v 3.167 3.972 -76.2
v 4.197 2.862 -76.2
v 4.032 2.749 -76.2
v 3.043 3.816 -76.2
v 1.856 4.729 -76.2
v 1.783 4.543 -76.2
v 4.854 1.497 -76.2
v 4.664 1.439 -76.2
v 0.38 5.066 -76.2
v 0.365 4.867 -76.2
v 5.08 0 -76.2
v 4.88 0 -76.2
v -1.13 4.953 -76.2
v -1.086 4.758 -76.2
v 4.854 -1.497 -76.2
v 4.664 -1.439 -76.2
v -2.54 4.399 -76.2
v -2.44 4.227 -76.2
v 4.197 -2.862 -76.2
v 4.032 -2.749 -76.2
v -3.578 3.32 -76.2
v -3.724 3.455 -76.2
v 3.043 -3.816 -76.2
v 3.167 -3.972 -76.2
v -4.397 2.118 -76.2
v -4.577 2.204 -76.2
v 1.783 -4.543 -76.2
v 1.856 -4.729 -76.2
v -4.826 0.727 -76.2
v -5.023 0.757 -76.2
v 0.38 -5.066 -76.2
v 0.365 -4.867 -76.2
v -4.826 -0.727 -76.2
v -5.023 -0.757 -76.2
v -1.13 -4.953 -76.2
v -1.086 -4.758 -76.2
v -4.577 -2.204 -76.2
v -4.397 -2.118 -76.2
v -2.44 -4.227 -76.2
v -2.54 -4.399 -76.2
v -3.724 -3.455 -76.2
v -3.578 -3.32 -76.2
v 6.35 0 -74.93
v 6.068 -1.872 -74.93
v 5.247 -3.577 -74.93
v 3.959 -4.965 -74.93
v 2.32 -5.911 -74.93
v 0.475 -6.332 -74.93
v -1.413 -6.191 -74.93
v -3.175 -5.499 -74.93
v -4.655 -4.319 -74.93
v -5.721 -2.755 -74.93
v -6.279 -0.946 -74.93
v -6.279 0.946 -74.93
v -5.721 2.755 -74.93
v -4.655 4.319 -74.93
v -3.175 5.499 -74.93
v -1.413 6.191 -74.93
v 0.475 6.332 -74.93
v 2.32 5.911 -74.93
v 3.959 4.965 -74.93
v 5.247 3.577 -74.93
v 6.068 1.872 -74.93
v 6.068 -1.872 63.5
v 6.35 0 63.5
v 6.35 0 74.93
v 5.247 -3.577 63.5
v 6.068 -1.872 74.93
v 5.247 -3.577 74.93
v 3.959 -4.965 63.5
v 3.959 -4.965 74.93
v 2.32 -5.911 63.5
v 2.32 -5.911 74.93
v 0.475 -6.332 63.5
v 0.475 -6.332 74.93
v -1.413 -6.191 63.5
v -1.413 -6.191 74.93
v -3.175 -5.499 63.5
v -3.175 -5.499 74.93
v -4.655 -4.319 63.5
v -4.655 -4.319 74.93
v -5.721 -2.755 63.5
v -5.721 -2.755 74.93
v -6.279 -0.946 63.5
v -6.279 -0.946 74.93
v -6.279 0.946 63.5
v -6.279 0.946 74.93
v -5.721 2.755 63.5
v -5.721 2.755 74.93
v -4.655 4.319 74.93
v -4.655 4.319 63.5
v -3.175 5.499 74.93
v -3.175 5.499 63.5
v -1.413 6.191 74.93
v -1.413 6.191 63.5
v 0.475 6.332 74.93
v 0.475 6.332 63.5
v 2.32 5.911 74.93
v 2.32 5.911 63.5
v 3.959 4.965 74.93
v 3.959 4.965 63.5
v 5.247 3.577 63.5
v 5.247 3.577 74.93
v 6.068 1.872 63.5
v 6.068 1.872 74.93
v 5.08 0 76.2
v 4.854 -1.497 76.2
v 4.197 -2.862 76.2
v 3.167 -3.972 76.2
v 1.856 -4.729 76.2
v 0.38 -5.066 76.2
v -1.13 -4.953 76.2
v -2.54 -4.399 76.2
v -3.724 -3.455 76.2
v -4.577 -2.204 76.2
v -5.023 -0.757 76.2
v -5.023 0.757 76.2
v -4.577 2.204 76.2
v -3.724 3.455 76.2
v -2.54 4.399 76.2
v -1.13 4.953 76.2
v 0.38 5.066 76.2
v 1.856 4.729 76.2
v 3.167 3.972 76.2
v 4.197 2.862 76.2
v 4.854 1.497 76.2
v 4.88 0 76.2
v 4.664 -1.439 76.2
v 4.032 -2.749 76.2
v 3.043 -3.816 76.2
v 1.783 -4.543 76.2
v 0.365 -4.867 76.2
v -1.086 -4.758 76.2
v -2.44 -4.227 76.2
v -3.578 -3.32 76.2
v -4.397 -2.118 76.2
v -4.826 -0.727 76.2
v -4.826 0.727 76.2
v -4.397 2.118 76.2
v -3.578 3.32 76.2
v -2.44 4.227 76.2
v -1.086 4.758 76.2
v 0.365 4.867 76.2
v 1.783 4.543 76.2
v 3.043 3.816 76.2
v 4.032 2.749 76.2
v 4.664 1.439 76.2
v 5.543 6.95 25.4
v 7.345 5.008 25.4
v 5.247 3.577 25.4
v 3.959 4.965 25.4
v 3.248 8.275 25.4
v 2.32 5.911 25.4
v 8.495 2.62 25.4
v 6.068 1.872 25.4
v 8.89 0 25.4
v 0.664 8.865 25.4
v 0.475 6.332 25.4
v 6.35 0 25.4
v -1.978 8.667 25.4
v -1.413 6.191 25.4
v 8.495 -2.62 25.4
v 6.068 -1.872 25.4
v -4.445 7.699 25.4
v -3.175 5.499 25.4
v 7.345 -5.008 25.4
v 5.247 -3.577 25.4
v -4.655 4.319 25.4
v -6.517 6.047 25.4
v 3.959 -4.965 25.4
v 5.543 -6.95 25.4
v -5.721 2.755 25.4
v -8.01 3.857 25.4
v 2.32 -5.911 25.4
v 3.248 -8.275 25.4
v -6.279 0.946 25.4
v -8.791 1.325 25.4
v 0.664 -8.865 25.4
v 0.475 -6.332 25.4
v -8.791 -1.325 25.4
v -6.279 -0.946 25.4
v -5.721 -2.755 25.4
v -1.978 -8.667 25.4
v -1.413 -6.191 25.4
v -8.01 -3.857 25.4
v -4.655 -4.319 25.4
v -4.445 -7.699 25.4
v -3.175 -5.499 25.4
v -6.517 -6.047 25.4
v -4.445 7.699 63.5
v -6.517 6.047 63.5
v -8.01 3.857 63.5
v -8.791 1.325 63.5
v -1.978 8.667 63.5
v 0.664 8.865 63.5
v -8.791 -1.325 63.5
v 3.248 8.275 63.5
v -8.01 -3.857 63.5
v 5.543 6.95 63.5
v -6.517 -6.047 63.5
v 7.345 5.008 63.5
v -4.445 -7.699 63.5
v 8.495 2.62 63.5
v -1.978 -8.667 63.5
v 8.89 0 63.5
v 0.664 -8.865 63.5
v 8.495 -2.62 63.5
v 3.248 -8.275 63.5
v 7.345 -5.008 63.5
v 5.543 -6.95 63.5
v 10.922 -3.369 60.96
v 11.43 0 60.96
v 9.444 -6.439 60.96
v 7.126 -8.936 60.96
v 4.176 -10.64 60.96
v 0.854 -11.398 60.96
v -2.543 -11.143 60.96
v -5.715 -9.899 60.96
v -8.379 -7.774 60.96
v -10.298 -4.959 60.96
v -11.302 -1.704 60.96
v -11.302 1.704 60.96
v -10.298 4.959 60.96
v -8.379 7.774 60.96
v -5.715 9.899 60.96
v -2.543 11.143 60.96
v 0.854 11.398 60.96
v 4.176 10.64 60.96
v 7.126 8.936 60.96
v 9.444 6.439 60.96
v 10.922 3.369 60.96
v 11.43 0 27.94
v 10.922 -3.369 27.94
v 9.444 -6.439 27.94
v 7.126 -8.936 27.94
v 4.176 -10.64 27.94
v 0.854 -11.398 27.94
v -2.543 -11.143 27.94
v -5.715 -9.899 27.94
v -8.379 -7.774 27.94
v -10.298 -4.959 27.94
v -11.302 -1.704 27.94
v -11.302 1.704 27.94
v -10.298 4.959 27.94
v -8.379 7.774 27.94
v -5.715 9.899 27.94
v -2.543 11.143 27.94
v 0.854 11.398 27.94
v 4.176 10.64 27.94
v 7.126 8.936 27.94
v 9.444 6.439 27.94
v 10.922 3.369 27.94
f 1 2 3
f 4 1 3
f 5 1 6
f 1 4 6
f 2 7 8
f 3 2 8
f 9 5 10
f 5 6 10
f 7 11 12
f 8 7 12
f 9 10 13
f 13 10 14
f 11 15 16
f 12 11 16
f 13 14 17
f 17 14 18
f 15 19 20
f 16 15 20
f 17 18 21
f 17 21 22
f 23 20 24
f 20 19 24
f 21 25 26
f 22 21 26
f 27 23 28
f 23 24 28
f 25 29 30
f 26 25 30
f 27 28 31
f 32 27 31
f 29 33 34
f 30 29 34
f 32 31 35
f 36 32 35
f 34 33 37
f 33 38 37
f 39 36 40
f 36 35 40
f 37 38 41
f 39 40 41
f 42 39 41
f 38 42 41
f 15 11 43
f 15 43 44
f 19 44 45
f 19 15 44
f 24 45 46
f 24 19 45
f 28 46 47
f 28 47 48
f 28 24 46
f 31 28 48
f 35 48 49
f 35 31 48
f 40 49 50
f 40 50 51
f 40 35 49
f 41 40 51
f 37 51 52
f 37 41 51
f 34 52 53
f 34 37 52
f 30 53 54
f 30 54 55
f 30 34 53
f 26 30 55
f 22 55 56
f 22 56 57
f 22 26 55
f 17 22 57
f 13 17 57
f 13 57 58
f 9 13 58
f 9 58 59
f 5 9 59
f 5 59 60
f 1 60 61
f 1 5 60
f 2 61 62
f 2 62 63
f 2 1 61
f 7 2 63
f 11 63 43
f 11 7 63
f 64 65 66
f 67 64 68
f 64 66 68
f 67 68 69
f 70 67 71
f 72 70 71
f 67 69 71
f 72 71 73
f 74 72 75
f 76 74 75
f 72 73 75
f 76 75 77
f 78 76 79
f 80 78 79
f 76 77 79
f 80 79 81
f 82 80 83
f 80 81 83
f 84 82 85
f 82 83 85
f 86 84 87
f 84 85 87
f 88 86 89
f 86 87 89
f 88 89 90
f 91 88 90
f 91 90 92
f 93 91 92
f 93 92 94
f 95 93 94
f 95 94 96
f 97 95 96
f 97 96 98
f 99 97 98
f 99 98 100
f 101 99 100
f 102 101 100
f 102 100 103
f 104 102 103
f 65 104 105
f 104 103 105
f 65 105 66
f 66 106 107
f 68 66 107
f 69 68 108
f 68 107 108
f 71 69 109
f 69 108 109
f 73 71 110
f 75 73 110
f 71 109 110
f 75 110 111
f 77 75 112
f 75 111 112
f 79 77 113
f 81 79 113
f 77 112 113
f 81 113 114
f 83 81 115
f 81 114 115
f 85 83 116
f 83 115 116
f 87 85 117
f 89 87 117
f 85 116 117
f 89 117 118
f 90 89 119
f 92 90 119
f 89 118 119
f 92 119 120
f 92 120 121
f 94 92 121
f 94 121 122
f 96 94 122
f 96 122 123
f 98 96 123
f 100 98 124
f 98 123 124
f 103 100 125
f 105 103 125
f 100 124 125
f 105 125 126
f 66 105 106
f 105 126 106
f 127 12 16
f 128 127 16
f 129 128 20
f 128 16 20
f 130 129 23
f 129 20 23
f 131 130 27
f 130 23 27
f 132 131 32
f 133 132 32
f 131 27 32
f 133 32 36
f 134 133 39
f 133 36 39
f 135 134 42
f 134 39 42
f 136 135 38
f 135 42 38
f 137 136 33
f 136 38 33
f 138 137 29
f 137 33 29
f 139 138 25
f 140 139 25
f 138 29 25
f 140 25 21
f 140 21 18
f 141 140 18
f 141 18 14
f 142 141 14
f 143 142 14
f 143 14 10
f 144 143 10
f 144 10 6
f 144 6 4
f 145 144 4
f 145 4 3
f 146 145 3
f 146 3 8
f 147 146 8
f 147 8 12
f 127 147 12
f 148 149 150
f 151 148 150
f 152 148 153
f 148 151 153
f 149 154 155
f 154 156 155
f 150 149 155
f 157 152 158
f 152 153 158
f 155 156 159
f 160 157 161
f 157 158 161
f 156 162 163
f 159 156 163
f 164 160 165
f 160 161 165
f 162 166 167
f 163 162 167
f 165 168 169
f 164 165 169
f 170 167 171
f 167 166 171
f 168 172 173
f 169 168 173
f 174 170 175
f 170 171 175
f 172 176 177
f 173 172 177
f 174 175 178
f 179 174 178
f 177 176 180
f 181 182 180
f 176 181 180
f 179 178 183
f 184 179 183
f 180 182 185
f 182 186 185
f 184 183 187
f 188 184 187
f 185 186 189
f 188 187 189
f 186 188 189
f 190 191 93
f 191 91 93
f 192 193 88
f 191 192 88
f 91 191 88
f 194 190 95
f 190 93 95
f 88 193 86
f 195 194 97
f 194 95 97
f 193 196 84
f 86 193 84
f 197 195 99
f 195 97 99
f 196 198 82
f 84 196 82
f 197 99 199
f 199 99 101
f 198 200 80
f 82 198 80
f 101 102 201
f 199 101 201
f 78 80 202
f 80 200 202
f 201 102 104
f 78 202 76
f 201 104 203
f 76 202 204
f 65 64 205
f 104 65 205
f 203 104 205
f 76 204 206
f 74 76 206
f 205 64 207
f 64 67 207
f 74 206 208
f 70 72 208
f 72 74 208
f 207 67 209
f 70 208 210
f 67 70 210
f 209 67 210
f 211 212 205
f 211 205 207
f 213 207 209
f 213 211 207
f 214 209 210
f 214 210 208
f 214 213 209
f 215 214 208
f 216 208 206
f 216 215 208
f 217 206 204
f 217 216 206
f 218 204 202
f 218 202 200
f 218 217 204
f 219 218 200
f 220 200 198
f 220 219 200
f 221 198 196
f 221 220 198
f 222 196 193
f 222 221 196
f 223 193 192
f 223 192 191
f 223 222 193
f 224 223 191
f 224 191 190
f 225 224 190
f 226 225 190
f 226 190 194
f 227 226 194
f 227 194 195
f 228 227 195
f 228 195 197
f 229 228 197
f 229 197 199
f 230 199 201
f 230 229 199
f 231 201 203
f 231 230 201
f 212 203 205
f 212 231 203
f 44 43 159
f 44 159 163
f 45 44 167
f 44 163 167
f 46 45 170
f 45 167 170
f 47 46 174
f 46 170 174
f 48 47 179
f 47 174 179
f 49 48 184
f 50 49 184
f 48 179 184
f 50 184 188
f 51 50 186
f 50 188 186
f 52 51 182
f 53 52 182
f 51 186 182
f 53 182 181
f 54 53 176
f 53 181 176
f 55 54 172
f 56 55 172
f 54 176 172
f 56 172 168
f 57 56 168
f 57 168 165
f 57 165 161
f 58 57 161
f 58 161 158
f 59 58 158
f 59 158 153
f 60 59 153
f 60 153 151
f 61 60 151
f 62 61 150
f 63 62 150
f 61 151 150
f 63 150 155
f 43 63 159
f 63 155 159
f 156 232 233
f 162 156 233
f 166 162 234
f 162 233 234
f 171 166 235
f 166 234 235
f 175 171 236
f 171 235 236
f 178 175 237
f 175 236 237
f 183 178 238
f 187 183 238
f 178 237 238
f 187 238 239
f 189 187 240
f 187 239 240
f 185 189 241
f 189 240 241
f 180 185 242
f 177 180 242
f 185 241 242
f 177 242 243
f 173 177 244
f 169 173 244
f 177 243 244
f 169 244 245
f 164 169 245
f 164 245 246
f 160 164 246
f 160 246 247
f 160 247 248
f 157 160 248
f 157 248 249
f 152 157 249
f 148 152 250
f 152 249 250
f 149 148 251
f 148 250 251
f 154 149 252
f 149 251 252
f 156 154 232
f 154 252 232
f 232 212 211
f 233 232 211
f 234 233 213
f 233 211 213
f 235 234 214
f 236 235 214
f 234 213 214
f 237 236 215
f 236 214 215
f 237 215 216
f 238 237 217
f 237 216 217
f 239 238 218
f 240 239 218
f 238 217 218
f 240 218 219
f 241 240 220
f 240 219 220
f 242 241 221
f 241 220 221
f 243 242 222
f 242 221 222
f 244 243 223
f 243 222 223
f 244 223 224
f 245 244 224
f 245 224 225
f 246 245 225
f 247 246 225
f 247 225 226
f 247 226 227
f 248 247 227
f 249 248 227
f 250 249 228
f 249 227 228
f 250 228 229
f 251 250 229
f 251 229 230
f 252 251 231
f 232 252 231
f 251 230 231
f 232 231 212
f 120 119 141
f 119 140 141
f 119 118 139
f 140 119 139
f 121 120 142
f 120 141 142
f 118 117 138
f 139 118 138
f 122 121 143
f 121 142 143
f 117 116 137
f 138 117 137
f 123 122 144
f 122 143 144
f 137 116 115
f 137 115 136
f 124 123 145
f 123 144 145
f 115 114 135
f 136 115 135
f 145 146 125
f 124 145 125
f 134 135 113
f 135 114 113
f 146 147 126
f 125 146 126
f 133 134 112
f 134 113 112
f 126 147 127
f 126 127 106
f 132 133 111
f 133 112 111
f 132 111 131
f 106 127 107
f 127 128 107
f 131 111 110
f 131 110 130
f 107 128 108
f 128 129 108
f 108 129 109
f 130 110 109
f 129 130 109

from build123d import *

# Parameters (mm, degrees)
F2_SIZE  = 2.54
F3_R     = 4.880462
F6_DEPTH = 152.401
F4_SIZE  = 1.27
F7_SIZE  = 2.54
F5_SIZE  = 1.27


with BuildPart() as f1:
    # F0 (on Front) → F1 (revolve)
    with BuildSketch(Plane.XZ):
        Polygon((0, -76.2), (6.35, -76.2), (6.35, 25.4), (11.43, 25.4), (11.43, 63.5), (6.35, 63.5), (6.35, 76.2), (0, 76.2), align=None)
    revolve(axis=Axis((0, 0, -2.097856), (0, 0, -1)))

    # F2
    f2_edges = [f1.edges().sort_by_distance(p)[0] for p in [
        (-11.43, 0, 25.4),
    ]]
    chamfer(f2_edges, length=F2_SIZE)

    # F3 (on face) → F6 (cut, through all)
    with BuildSketch(Plane(origin=(0, 0, -76.2), x_dir=(1, 0, 0), z_dir=(0, 0, -1))):
        Circle(F3_R)
    extrude(amount=-F6_DEPTH, mode=Mode.SUBTRACT)

    # F4
    f4_edges = [f1.edges().sort_by_distance(p)[0] for p in [
        (-6.35, 0, 76.2),
    ]]
    chamfer(f4_edges, length=F4_SIZE)

    # F7
    f7_edges = [f1.edges().sort_by_distance(p)[0] for p in [
        (-11.43, 0, 63.5),
    ]]
    chamfer(f7_edges, length=F7_SIZE)

    # F5
    f5_edges = [f1.edges().sort_by_distance(p)[0] for p in [
        (-6.35, 0, -76.2),
    ]]
    chamfer(f5_edges, length=F5_SIZE)


solid = f1.part
